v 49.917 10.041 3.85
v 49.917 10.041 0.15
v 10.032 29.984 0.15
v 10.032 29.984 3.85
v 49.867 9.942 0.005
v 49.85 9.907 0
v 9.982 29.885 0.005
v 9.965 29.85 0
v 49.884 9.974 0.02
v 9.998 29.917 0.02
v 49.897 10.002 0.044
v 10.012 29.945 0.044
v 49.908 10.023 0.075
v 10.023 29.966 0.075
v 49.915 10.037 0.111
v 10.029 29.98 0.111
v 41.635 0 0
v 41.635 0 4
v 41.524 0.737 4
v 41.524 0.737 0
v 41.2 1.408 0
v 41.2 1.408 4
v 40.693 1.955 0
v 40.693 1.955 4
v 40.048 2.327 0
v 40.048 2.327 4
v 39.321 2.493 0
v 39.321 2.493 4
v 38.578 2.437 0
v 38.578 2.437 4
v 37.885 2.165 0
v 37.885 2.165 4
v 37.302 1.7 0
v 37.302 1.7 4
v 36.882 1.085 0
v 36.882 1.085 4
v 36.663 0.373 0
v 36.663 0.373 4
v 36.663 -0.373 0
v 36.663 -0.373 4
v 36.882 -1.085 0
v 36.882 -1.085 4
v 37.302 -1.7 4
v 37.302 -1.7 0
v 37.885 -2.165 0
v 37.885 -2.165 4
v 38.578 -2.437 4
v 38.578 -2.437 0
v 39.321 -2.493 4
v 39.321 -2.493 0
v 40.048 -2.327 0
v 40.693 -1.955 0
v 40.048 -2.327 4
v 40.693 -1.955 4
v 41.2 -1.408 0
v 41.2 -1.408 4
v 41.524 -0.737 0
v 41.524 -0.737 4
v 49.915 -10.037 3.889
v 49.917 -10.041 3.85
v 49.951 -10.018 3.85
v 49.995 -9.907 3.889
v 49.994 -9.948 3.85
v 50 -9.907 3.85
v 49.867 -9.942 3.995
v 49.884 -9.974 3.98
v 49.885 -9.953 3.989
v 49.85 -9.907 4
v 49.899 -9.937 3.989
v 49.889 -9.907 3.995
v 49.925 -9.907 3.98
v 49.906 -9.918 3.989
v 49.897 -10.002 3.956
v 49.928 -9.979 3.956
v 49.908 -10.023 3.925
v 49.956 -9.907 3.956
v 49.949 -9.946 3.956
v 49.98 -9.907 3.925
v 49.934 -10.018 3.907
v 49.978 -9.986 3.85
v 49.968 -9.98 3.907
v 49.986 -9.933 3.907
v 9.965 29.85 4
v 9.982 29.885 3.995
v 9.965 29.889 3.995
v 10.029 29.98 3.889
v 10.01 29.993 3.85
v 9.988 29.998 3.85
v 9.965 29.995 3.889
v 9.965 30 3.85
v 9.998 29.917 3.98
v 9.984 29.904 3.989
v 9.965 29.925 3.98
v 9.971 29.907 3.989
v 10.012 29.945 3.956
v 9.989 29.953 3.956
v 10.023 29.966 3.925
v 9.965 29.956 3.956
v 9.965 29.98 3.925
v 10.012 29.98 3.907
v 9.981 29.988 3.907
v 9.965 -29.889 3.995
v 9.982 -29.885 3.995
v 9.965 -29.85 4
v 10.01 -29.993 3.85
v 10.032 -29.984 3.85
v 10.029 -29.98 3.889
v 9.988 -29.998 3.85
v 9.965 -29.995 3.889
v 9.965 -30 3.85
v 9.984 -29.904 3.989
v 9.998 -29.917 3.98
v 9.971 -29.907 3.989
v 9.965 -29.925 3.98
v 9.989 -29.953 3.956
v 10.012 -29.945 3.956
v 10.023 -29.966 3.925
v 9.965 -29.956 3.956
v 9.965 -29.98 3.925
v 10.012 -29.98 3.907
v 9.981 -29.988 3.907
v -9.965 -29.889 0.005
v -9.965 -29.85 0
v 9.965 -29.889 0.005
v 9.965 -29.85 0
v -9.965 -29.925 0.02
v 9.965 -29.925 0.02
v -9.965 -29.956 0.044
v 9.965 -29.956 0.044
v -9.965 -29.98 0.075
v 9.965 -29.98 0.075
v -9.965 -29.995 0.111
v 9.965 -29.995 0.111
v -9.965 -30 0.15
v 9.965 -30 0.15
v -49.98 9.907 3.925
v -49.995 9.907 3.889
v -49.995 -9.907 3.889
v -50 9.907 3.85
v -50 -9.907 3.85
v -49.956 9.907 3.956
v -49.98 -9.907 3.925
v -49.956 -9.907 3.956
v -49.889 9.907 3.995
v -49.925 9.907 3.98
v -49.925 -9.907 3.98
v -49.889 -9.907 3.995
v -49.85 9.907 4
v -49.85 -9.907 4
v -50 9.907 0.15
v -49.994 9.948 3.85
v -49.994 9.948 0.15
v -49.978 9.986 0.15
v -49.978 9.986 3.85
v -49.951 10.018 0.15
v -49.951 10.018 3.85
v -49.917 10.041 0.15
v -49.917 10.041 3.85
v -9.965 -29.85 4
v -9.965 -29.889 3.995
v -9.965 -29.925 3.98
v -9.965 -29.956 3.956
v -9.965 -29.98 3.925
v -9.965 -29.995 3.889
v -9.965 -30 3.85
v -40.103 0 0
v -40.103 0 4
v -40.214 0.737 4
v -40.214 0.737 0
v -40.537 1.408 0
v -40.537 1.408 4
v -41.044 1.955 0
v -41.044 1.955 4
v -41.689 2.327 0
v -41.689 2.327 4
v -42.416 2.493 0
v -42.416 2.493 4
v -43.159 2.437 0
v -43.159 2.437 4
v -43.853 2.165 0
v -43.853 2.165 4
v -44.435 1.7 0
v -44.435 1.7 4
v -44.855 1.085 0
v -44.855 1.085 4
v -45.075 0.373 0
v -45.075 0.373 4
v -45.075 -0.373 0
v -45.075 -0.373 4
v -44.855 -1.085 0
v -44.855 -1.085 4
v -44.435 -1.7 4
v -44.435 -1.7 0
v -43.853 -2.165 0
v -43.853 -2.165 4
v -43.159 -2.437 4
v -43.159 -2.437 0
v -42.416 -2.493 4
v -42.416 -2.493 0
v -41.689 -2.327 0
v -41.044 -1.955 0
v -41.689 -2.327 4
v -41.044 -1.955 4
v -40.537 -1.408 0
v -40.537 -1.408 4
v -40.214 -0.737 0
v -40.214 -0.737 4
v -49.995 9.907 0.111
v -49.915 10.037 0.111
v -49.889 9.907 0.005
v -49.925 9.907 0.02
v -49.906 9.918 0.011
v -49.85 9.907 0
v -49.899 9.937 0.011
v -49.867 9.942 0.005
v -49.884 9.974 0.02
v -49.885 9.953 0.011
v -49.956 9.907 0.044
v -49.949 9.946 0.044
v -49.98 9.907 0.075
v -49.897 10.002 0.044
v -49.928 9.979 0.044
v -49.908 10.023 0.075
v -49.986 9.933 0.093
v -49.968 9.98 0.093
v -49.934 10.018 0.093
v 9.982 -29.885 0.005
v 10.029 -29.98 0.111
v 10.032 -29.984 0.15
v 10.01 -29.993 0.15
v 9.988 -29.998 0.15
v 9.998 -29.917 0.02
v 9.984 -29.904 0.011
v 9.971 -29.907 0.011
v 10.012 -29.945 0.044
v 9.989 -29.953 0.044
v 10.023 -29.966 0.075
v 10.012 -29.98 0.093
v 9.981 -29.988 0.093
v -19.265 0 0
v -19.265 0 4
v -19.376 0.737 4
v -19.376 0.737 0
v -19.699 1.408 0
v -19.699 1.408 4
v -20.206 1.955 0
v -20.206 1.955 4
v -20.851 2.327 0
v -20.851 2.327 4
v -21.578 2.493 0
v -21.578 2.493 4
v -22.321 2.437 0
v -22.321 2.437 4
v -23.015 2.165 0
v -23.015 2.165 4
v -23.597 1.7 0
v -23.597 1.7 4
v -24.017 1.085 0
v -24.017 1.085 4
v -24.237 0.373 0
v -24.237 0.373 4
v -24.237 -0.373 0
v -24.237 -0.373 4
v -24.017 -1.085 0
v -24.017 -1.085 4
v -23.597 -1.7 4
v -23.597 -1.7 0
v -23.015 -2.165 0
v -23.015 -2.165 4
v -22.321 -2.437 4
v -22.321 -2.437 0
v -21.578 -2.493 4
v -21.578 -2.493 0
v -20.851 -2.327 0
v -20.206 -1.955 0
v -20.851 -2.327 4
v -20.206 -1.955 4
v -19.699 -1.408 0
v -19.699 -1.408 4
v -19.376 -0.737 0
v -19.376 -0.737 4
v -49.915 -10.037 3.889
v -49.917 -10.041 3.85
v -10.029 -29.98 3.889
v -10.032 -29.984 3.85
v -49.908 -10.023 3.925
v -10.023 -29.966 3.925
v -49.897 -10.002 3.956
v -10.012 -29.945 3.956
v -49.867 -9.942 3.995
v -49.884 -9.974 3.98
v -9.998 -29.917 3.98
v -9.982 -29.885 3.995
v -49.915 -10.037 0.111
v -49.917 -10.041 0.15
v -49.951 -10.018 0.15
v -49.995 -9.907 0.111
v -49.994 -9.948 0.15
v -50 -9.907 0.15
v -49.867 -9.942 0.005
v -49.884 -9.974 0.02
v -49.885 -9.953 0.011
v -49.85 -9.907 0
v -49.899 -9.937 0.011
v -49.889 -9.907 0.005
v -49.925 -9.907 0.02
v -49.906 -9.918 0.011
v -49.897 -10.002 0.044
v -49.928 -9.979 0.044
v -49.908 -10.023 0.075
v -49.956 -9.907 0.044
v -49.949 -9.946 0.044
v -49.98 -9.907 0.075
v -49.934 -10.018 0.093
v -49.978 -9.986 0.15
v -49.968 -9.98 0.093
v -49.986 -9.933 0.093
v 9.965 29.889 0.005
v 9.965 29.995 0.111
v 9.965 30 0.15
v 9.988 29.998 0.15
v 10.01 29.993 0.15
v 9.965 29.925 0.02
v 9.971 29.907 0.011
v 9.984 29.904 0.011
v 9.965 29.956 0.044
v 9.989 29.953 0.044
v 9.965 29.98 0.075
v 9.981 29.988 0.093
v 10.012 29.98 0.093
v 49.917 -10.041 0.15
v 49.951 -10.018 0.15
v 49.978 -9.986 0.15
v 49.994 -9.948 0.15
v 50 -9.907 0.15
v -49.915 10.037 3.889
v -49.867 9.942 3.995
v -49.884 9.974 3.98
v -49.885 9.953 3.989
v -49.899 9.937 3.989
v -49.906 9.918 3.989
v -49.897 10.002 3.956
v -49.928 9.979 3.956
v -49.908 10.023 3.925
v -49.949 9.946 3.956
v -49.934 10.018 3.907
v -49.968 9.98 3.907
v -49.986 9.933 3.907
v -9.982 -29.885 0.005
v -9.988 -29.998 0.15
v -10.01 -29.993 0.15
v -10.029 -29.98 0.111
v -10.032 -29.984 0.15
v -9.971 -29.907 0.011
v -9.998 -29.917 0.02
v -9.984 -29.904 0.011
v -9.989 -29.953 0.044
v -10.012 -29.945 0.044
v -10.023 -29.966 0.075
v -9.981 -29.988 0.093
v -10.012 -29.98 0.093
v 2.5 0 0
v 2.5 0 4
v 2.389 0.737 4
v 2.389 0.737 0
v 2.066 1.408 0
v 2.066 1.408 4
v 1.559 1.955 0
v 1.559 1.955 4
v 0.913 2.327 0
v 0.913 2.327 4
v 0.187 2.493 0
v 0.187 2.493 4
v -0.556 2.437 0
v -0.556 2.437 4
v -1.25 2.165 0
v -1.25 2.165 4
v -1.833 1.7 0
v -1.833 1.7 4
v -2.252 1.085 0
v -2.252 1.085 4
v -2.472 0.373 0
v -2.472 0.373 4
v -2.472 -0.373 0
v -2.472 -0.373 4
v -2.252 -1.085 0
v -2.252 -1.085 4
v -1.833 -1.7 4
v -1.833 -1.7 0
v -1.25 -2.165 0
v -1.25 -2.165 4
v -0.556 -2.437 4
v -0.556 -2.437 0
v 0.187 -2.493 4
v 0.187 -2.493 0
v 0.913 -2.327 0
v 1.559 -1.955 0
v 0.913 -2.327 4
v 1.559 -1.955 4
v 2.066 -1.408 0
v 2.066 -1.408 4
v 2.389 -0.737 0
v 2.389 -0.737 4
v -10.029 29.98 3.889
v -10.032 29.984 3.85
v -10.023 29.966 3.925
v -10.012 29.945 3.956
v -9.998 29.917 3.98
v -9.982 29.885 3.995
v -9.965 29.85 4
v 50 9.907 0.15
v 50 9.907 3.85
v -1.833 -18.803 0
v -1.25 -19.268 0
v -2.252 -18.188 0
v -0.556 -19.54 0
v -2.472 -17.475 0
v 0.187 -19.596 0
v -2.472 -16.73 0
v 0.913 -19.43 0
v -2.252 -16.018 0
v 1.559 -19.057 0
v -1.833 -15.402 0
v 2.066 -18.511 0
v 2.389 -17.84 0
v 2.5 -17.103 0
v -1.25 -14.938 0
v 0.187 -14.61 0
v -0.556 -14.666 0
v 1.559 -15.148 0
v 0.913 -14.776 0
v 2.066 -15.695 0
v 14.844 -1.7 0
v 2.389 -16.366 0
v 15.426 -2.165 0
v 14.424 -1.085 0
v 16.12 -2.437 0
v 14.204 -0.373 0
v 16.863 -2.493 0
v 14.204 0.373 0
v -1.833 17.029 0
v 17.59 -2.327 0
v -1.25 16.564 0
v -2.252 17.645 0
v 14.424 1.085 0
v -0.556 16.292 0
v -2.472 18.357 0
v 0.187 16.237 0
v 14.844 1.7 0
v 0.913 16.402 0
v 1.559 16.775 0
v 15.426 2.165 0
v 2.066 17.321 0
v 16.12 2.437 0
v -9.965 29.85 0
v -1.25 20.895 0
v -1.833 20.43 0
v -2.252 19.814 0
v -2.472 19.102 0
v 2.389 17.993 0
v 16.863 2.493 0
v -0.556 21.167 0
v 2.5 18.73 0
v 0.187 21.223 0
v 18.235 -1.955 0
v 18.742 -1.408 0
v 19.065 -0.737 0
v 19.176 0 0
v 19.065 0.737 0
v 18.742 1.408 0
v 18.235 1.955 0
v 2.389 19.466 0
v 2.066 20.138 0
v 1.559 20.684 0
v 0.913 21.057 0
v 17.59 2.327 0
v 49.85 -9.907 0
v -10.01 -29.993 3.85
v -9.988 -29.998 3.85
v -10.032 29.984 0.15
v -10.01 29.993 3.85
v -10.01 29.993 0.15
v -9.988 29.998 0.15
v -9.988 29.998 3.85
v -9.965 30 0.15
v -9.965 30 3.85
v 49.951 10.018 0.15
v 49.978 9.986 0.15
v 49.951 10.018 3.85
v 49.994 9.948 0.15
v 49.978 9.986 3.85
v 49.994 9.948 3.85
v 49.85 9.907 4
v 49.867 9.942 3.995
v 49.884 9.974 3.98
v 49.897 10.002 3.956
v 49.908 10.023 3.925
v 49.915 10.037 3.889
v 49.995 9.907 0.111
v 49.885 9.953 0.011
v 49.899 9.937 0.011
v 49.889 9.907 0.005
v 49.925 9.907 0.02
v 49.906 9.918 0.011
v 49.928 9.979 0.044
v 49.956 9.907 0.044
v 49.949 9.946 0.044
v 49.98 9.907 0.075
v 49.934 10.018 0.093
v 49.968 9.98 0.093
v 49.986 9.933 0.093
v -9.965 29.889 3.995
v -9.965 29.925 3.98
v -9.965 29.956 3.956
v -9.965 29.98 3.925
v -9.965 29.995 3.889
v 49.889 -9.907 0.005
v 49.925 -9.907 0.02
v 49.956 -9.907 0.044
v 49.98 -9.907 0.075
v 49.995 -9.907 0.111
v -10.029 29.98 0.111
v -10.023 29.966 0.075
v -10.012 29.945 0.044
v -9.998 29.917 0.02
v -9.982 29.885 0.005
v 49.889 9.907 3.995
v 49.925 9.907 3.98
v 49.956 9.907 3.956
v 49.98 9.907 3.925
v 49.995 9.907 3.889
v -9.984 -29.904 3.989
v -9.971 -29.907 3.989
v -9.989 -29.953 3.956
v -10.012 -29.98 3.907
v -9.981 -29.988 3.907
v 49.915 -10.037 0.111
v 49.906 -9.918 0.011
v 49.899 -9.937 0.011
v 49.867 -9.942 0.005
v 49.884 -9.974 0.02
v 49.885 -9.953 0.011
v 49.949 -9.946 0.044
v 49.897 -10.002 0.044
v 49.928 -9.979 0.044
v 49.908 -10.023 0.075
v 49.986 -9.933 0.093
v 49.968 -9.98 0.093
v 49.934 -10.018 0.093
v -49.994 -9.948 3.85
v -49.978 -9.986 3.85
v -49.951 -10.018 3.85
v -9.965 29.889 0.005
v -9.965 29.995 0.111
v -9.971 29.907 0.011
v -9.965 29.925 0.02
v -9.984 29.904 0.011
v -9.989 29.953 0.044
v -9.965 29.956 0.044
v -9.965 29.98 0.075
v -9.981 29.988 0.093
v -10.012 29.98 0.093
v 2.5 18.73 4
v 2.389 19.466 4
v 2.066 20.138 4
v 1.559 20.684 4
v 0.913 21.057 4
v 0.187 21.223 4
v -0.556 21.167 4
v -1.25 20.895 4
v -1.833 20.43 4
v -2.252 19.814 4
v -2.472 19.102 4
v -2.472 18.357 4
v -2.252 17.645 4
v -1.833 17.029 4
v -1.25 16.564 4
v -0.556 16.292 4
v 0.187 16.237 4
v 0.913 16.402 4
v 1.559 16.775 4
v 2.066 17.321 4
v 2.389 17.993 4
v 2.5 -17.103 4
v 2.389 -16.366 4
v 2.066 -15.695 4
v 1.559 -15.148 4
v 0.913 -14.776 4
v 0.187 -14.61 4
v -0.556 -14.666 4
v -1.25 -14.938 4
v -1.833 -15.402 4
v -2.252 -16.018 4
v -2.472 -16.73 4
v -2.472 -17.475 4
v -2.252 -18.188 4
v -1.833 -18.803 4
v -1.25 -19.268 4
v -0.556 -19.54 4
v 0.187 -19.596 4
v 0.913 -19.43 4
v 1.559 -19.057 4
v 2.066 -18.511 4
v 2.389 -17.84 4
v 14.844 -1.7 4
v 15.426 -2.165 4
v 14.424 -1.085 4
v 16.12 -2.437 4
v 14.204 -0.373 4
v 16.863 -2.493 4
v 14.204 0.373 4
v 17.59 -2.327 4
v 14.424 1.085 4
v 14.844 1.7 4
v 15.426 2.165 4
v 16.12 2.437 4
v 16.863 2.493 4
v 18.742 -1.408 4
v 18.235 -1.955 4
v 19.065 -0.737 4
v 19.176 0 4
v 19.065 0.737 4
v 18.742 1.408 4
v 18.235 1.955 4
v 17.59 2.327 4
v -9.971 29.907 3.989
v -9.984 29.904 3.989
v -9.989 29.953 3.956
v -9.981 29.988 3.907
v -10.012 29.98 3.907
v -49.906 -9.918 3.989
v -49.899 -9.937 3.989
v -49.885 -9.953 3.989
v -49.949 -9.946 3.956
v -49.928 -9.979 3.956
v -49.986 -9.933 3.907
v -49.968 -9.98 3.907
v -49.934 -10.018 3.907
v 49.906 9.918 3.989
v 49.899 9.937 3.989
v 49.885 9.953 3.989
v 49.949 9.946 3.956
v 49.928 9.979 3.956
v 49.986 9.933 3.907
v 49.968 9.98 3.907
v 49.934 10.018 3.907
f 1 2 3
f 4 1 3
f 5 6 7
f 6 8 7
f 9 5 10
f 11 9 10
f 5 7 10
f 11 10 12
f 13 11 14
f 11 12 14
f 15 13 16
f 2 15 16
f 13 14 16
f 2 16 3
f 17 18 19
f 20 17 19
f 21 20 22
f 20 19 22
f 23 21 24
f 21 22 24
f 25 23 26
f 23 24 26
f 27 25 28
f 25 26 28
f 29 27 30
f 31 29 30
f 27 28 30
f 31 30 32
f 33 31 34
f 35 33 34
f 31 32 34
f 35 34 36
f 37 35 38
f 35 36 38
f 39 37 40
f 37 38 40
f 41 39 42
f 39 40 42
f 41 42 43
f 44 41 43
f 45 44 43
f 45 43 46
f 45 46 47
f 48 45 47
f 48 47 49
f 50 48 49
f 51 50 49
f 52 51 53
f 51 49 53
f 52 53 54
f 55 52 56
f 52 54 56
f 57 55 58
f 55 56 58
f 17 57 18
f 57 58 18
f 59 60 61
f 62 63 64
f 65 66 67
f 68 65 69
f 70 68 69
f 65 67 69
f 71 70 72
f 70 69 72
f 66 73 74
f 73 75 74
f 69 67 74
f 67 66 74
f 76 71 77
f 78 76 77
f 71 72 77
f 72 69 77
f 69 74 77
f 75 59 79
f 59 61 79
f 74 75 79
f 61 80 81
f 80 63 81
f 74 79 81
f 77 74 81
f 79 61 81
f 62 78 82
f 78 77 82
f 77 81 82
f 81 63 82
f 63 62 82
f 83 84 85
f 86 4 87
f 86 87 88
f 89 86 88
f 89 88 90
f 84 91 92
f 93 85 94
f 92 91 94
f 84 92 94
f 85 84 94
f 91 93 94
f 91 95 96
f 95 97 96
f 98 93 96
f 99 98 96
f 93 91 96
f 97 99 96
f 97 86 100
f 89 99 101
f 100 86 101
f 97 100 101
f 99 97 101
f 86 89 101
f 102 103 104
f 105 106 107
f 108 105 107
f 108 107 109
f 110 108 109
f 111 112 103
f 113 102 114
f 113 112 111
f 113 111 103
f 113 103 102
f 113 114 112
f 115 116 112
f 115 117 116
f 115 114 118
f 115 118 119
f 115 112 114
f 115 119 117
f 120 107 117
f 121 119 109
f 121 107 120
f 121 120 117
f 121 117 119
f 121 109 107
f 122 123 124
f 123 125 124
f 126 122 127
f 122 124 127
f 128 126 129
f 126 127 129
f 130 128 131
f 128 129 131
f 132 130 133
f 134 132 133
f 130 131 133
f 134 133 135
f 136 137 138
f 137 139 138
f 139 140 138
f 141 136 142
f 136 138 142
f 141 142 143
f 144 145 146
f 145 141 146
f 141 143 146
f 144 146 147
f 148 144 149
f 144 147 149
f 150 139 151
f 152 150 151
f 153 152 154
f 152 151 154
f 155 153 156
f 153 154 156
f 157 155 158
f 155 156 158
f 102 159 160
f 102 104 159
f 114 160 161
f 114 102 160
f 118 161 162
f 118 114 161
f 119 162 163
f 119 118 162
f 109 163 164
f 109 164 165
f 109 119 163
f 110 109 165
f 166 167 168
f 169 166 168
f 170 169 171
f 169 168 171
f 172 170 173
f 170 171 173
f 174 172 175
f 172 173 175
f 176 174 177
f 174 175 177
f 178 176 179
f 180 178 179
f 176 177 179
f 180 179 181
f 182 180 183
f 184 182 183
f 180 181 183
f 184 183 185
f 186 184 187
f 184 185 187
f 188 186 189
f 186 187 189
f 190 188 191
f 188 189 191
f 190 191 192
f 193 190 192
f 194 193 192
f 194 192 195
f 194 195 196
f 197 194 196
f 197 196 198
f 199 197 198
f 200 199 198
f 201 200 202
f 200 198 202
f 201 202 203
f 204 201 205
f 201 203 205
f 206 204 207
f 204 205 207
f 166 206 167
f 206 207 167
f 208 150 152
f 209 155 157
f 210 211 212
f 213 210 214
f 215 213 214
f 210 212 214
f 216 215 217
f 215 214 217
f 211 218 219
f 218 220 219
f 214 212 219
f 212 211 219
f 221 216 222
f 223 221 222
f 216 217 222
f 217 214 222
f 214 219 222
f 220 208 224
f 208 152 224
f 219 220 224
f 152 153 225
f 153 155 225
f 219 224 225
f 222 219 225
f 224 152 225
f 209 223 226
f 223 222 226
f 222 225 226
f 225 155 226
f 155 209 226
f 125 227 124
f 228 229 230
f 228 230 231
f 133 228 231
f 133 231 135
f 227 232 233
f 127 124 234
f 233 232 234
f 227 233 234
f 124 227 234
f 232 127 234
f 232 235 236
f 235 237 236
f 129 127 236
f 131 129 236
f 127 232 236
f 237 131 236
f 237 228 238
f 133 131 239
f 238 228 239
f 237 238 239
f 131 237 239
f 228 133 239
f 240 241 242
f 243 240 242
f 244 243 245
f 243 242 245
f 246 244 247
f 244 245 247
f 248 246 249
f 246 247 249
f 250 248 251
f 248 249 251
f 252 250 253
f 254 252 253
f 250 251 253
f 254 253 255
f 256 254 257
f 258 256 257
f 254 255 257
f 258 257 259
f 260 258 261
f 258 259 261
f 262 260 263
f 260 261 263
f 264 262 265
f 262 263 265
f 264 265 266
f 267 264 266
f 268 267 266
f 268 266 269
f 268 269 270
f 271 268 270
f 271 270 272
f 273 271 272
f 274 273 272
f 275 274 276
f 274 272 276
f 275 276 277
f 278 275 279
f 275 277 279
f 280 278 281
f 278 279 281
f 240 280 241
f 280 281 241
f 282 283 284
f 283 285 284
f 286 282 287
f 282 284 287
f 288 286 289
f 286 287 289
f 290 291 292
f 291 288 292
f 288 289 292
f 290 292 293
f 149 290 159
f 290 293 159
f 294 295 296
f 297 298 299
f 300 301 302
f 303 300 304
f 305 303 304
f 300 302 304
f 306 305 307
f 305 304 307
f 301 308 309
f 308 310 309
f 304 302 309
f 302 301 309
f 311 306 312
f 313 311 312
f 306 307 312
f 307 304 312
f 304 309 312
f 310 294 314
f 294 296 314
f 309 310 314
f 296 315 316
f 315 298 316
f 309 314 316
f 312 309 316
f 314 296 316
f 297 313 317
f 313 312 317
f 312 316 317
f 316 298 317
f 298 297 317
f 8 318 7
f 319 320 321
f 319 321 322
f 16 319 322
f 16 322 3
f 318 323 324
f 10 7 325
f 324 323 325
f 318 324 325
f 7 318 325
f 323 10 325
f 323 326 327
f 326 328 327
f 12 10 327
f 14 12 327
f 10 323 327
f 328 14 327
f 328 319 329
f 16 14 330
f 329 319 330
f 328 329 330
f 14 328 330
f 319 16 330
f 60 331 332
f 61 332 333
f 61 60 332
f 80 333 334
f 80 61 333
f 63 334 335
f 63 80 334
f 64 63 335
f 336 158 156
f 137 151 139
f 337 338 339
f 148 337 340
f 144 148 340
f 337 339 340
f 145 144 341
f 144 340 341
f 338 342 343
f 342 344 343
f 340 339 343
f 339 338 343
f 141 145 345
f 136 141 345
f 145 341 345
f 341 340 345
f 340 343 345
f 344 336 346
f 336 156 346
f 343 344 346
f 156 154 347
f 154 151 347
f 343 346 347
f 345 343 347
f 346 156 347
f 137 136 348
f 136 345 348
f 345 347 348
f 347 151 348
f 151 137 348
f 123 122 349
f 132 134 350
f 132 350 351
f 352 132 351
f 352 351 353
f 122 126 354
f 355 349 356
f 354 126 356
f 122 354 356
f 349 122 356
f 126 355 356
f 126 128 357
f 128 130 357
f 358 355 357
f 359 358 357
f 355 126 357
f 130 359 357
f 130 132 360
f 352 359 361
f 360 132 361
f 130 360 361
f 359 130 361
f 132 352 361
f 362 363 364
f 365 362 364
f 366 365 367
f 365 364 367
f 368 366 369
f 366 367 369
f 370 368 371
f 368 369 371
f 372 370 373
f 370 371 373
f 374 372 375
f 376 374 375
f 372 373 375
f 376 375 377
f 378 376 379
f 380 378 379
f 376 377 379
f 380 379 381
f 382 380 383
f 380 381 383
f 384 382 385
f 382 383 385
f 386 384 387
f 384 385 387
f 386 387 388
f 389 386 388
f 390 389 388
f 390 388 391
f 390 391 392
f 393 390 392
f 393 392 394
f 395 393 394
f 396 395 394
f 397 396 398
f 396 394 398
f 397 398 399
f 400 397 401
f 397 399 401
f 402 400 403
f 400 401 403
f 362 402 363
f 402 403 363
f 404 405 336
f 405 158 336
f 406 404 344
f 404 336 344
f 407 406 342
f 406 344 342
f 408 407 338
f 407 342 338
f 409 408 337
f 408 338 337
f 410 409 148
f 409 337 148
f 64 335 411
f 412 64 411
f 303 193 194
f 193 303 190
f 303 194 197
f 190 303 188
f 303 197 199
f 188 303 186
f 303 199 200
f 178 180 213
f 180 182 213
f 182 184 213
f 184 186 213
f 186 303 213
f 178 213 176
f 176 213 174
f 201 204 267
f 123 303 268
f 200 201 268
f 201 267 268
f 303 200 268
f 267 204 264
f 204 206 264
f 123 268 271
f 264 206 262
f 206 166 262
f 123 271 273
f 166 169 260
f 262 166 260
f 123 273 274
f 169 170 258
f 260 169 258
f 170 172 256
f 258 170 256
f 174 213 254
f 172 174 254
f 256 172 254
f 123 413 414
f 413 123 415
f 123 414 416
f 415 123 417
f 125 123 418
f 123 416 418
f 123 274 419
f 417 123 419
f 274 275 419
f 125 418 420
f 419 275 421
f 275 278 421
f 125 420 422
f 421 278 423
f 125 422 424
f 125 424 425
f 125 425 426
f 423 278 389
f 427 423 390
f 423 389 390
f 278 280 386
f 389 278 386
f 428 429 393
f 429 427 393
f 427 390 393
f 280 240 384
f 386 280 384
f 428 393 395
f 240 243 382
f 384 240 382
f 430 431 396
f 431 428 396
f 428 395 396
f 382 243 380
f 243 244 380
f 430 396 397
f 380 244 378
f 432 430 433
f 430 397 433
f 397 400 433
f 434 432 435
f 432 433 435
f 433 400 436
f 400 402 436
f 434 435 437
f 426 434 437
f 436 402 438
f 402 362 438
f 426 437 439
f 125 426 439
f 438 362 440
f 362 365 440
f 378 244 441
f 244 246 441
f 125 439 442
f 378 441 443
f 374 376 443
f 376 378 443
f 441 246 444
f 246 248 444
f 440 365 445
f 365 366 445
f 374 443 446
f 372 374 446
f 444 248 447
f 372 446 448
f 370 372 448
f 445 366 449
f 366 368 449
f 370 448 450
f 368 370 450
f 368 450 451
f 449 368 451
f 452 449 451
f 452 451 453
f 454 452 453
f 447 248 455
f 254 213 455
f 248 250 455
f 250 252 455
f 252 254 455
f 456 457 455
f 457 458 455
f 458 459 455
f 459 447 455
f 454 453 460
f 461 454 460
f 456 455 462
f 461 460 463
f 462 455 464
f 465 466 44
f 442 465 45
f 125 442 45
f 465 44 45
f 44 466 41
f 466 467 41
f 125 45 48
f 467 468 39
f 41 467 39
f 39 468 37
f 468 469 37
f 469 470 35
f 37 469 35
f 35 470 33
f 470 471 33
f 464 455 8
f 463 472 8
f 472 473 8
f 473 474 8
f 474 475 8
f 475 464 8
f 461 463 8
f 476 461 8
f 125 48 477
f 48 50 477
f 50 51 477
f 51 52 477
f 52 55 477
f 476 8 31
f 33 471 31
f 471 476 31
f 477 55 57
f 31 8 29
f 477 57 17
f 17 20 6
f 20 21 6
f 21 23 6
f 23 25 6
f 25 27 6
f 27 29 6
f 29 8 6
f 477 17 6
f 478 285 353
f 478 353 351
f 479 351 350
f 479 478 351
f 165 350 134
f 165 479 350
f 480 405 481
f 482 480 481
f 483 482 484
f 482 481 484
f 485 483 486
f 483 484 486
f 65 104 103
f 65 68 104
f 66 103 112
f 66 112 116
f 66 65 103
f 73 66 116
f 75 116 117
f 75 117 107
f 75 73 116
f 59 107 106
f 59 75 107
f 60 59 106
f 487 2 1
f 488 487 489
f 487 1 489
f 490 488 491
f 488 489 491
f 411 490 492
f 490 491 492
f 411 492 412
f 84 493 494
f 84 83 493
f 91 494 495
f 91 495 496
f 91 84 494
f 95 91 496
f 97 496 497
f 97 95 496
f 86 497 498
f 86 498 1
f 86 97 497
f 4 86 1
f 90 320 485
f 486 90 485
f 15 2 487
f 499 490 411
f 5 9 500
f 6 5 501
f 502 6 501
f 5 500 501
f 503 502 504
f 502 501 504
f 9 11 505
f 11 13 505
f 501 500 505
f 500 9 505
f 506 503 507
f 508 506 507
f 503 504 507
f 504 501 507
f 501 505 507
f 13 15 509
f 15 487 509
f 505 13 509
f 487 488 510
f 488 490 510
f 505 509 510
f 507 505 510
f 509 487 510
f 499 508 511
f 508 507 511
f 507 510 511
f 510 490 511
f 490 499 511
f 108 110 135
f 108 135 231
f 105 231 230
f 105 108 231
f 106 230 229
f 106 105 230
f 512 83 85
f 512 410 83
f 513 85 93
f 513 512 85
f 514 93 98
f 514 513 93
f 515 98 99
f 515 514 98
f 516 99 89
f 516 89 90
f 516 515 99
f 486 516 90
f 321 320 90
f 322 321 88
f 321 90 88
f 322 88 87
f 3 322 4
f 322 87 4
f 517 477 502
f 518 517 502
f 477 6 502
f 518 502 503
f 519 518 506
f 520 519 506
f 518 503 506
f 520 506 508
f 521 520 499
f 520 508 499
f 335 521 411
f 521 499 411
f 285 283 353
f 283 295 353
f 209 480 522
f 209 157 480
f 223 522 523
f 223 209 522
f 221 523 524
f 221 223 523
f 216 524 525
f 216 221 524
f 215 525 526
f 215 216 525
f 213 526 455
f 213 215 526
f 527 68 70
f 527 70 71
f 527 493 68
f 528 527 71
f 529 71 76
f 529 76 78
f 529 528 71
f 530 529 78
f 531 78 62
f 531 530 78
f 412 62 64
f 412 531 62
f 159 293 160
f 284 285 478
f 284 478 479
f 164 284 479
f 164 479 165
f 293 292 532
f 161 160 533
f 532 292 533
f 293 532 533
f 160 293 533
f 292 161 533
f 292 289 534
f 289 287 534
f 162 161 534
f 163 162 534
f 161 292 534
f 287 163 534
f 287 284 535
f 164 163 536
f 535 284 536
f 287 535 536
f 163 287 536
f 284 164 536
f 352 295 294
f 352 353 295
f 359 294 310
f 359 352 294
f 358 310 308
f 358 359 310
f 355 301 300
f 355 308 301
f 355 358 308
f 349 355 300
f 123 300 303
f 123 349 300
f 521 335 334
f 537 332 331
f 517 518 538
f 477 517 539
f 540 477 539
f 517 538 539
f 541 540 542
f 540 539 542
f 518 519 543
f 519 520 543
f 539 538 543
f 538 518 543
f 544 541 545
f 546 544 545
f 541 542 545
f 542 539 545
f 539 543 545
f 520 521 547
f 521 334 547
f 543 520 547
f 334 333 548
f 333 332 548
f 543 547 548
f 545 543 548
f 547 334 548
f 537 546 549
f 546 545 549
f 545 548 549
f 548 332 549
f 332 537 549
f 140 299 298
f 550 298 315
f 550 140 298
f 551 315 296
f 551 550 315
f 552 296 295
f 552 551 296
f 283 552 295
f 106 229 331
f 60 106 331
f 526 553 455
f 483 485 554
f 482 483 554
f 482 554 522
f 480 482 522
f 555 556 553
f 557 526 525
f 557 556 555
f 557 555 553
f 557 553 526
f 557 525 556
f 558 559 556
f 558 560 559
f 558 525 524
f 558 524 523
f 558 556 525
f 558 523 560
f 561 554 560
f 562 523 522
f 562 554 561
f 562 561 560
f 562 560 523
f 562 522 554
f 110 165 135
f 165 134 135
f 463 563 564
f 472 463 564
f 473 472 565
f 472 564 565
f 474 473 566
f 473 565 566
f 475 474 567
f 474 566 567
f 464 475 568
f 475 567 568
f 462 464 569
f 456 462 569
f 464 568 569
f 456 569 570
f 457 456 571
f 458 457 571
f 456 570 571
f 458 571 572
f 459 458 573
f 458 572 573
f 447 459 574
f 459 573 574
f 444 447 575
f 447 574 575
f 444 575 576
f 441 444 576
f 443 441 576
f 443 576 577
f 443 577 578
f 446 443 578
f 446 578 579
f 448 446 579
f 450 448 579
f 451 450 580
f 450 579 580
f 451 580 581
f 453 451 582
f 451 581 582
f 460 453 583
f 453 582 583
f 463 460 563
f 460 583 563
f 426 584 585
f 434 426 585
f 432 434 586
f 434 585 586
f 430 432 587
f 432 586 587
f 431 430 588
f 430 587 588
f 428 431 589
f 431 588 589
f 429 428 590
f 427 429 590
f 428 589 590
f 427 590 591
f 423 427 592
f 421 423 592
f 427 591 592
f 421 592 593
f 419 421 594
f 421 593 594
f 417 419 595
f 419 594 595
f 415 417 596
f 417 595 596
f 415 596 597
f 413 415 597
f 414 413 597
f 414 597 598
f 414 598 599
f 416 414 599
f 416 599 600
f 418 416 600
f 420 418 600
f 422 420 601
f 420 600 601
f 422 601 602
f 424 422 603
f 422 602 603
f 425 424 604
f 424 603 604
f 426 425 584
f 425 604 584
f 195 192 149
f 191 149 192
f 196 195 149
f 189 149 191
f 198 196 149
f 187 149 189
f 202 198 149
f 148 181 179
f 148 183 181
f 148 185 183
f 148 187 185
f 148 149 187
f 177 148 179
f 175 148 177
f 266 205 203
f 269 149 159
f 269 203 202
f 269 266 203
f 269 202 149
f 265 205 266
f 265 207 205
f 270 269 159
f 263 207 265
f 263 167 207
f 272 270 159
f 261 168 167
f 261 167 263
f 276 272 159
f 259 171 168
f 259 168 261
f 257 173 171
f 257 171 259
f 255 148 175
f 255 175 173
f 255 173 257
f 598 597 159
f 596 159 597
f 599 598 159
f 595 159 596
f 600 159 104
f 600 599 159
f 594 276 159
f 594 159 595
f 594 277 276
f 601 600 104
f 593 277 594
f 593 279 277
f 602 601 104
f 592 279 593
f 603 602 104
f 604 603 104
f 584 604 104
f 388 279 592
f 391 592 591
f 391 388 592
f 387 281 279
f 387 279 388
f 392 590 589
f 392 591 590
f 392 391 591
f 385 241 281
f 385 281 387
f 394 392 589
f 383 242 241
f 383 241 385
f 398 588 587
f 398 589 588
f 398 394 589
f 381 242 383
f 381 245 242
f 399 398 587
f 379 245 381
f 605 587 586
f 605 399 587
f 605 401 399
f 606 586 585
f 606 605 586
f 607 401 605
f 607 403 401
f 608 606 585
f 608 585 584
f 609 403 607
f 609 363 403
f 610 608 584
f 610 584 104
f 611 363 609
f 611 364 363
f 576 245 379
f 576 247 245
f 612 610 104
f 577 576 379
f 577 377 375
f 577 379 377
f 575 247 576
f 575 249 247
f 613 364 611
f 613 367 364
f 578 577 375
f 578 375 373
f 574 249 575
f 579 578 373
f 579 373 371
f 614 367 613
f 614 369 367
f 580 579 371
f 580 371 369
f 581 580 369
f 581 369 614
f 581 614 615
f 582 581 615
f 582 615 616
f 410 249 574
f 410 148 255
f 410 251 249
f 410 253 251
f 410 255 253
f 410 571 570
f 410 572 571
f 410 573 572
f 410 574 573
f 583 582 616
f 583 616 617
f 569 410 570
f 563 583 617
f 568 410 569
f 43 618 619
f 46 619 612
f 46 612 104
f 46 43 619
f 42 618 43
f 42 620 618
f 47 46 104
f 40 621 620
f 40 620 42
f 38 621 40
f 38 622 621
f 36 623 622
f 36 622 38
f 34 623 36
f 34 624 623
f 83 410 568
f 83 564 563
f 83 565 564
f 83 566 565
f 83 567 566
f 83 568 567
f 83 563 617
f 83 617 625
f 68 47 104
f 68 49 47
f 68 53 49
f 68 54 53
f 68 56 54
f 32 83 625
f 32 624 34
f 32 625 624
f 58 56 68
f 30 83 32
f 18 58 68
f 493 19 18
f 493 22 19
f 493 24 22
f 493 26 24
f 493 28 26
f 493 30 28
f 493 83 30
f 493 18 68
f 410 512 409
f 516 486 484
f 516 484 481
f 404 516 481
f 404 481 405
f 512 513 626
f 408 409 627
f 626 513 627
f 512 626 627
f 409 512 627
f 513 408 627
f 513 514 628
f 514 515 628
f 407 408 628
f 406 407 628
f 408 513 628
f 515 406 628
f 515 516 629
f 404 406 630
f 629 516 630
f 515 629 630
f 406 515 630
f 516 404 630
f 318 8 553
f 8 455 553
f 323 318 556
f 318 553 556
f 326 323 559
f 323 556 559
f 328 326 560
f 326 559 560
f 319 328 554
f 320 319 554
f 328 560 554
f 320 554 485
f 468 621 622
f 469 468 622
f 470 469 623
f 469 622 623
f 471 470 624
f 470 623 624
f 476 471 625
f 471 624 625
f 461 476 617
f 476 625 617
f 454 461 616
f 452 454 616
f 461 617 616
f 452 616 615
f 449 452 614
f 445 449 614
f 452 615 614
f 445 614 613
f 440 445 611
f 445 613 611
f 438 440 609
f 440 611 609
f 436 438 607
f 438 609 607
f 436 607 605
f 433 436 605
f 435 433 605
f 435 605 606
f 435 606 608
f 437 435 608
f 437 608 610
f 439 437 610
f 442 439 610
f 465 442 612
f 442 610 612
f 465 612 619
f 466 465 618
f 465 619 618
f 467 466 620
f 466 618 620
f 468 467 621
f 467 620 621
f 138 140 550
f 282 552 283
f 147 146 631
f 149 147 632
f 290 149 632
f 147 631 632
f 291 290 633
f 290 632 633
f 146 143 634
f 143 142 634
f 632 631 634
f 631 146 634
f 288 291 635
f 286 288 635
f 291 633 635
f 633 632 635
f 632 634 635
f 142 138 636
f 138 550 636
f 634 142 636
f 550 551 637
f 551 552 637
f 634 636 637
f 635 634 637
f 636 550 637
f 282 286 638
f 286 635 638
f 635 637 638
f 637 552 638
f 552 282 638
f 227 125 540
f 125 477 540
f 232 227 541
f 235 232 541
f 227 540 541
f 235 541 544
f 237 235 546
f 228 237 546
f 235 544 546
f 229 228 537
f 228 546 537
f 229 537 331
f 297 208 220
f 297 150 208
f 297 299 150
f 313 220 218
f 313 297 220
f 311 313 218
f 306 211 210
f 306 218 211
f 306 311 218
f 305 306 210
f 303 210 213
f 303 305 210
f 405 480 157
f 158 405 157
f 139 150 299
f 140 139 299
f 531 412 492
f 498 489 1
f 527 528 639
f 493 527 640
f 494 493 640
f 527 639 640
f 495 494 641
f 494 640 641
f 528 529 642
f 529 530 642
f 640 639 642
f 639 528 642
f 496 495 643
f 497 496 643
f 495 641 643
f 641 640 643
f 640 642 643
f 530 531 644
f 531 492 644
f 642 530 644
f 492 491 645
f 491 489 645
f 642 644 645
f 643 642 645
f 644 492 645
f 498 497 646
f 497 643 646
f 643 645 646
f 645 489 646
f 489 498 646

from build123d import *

# Parameters (mm, degrees)
BOSS_EXTRUDE2_DEPTH = 4
SKETCH4_OUTSIDE_W   = 125.338
SKETCH4_OUTSIDE_H   = 85.338
SKETCH4_OUTSIDE_R   = 2.5
CUT_EXTRUDE4_DEPTH  = 4
FILLET1_R           = 0.15


with BuildPart() as part:
    # Sketch1 → Boss-Extrude2 (new body)
    with BuildSketch(Plane.XY):
        Polygon((-50, 10), (-50, -10), (-10, -30), (10, -30), (50, -10), (50, 10), (10, 30), (-10, 30), align=None)
    extrude(amount=BOSS_EXTRUDE2_DEPTH)

    # Sketch4 outside → Cut-Extrude4 (cut)
    with BuildSketch(Plane.XY.offset(4)):
        Rectangle(SKETCH4_OUTSIDE_W, SKETCH4_OUTSIDE_H)
        Polygon((-10, 30), (-50, 10), (-50, -10), (-10, -30), (10, -30), (50, -10), (50, 10), (10, 30), align=None, mode=Mode.SUBTRACT)
        Circle(SKETCH4_OUTSIDE_R)
        with Locations((-21.764530358, 0)):
            Circle(SKETCH4_OUTSIDE_R)
        with Locations((-42.602849817, 0)):
            Circle(SKETCH4_OUTSIDE_R)
        with Locations((16.676409958, 0)):
            Circle(SKETCH4_OUTSIDE_R)
        with Locations((39.134669841, 0)):
            Circle(SKETCH4_OUTSIDE_R)
        with Locations((0, 18.729540895)):
            Circle(SKETCH4_OUTSIDE_R)
        with Locations((0, -17.102871632)):
            Circle(SKETCH4_OUTSIDE_R)
    extrude(amount=-CUT_EXTRUDE4_DEPTH, mode=Mode.SUBTRACT)

    # Fillet1
    fillet1_edges = [part.edges().sort_by_distance(p)[0] for p in [
        (-30, -20, 4),
        (-50, 0, 0),
        (-30, 20, 0),
        (0, -30, 4),
        (-10, 30, 2),
        (10, 30, 2),
        (50, 10, 2),
        (50, -10, 2),
        (10, -30, 2),
        (-10, -30, 2),
        (-50, -10, 2),
        (-50, 10, 2),
        (30, -20, 4),
        (50, 0, 4),
        (30, 20, 4),
        (0, 30, 4),
        (-30, 20, 4),
        (-50, 0, 4),
        (0, 30, 0),
        (30, 20, 0),
        (50, 0, 0),
        (30, -20, 0),
        (0, -30, 0),
        (-30, -20, 0),
    ]]
    fillet(fillet1_edges, radius=FILLET1_R)


solid = part.part
